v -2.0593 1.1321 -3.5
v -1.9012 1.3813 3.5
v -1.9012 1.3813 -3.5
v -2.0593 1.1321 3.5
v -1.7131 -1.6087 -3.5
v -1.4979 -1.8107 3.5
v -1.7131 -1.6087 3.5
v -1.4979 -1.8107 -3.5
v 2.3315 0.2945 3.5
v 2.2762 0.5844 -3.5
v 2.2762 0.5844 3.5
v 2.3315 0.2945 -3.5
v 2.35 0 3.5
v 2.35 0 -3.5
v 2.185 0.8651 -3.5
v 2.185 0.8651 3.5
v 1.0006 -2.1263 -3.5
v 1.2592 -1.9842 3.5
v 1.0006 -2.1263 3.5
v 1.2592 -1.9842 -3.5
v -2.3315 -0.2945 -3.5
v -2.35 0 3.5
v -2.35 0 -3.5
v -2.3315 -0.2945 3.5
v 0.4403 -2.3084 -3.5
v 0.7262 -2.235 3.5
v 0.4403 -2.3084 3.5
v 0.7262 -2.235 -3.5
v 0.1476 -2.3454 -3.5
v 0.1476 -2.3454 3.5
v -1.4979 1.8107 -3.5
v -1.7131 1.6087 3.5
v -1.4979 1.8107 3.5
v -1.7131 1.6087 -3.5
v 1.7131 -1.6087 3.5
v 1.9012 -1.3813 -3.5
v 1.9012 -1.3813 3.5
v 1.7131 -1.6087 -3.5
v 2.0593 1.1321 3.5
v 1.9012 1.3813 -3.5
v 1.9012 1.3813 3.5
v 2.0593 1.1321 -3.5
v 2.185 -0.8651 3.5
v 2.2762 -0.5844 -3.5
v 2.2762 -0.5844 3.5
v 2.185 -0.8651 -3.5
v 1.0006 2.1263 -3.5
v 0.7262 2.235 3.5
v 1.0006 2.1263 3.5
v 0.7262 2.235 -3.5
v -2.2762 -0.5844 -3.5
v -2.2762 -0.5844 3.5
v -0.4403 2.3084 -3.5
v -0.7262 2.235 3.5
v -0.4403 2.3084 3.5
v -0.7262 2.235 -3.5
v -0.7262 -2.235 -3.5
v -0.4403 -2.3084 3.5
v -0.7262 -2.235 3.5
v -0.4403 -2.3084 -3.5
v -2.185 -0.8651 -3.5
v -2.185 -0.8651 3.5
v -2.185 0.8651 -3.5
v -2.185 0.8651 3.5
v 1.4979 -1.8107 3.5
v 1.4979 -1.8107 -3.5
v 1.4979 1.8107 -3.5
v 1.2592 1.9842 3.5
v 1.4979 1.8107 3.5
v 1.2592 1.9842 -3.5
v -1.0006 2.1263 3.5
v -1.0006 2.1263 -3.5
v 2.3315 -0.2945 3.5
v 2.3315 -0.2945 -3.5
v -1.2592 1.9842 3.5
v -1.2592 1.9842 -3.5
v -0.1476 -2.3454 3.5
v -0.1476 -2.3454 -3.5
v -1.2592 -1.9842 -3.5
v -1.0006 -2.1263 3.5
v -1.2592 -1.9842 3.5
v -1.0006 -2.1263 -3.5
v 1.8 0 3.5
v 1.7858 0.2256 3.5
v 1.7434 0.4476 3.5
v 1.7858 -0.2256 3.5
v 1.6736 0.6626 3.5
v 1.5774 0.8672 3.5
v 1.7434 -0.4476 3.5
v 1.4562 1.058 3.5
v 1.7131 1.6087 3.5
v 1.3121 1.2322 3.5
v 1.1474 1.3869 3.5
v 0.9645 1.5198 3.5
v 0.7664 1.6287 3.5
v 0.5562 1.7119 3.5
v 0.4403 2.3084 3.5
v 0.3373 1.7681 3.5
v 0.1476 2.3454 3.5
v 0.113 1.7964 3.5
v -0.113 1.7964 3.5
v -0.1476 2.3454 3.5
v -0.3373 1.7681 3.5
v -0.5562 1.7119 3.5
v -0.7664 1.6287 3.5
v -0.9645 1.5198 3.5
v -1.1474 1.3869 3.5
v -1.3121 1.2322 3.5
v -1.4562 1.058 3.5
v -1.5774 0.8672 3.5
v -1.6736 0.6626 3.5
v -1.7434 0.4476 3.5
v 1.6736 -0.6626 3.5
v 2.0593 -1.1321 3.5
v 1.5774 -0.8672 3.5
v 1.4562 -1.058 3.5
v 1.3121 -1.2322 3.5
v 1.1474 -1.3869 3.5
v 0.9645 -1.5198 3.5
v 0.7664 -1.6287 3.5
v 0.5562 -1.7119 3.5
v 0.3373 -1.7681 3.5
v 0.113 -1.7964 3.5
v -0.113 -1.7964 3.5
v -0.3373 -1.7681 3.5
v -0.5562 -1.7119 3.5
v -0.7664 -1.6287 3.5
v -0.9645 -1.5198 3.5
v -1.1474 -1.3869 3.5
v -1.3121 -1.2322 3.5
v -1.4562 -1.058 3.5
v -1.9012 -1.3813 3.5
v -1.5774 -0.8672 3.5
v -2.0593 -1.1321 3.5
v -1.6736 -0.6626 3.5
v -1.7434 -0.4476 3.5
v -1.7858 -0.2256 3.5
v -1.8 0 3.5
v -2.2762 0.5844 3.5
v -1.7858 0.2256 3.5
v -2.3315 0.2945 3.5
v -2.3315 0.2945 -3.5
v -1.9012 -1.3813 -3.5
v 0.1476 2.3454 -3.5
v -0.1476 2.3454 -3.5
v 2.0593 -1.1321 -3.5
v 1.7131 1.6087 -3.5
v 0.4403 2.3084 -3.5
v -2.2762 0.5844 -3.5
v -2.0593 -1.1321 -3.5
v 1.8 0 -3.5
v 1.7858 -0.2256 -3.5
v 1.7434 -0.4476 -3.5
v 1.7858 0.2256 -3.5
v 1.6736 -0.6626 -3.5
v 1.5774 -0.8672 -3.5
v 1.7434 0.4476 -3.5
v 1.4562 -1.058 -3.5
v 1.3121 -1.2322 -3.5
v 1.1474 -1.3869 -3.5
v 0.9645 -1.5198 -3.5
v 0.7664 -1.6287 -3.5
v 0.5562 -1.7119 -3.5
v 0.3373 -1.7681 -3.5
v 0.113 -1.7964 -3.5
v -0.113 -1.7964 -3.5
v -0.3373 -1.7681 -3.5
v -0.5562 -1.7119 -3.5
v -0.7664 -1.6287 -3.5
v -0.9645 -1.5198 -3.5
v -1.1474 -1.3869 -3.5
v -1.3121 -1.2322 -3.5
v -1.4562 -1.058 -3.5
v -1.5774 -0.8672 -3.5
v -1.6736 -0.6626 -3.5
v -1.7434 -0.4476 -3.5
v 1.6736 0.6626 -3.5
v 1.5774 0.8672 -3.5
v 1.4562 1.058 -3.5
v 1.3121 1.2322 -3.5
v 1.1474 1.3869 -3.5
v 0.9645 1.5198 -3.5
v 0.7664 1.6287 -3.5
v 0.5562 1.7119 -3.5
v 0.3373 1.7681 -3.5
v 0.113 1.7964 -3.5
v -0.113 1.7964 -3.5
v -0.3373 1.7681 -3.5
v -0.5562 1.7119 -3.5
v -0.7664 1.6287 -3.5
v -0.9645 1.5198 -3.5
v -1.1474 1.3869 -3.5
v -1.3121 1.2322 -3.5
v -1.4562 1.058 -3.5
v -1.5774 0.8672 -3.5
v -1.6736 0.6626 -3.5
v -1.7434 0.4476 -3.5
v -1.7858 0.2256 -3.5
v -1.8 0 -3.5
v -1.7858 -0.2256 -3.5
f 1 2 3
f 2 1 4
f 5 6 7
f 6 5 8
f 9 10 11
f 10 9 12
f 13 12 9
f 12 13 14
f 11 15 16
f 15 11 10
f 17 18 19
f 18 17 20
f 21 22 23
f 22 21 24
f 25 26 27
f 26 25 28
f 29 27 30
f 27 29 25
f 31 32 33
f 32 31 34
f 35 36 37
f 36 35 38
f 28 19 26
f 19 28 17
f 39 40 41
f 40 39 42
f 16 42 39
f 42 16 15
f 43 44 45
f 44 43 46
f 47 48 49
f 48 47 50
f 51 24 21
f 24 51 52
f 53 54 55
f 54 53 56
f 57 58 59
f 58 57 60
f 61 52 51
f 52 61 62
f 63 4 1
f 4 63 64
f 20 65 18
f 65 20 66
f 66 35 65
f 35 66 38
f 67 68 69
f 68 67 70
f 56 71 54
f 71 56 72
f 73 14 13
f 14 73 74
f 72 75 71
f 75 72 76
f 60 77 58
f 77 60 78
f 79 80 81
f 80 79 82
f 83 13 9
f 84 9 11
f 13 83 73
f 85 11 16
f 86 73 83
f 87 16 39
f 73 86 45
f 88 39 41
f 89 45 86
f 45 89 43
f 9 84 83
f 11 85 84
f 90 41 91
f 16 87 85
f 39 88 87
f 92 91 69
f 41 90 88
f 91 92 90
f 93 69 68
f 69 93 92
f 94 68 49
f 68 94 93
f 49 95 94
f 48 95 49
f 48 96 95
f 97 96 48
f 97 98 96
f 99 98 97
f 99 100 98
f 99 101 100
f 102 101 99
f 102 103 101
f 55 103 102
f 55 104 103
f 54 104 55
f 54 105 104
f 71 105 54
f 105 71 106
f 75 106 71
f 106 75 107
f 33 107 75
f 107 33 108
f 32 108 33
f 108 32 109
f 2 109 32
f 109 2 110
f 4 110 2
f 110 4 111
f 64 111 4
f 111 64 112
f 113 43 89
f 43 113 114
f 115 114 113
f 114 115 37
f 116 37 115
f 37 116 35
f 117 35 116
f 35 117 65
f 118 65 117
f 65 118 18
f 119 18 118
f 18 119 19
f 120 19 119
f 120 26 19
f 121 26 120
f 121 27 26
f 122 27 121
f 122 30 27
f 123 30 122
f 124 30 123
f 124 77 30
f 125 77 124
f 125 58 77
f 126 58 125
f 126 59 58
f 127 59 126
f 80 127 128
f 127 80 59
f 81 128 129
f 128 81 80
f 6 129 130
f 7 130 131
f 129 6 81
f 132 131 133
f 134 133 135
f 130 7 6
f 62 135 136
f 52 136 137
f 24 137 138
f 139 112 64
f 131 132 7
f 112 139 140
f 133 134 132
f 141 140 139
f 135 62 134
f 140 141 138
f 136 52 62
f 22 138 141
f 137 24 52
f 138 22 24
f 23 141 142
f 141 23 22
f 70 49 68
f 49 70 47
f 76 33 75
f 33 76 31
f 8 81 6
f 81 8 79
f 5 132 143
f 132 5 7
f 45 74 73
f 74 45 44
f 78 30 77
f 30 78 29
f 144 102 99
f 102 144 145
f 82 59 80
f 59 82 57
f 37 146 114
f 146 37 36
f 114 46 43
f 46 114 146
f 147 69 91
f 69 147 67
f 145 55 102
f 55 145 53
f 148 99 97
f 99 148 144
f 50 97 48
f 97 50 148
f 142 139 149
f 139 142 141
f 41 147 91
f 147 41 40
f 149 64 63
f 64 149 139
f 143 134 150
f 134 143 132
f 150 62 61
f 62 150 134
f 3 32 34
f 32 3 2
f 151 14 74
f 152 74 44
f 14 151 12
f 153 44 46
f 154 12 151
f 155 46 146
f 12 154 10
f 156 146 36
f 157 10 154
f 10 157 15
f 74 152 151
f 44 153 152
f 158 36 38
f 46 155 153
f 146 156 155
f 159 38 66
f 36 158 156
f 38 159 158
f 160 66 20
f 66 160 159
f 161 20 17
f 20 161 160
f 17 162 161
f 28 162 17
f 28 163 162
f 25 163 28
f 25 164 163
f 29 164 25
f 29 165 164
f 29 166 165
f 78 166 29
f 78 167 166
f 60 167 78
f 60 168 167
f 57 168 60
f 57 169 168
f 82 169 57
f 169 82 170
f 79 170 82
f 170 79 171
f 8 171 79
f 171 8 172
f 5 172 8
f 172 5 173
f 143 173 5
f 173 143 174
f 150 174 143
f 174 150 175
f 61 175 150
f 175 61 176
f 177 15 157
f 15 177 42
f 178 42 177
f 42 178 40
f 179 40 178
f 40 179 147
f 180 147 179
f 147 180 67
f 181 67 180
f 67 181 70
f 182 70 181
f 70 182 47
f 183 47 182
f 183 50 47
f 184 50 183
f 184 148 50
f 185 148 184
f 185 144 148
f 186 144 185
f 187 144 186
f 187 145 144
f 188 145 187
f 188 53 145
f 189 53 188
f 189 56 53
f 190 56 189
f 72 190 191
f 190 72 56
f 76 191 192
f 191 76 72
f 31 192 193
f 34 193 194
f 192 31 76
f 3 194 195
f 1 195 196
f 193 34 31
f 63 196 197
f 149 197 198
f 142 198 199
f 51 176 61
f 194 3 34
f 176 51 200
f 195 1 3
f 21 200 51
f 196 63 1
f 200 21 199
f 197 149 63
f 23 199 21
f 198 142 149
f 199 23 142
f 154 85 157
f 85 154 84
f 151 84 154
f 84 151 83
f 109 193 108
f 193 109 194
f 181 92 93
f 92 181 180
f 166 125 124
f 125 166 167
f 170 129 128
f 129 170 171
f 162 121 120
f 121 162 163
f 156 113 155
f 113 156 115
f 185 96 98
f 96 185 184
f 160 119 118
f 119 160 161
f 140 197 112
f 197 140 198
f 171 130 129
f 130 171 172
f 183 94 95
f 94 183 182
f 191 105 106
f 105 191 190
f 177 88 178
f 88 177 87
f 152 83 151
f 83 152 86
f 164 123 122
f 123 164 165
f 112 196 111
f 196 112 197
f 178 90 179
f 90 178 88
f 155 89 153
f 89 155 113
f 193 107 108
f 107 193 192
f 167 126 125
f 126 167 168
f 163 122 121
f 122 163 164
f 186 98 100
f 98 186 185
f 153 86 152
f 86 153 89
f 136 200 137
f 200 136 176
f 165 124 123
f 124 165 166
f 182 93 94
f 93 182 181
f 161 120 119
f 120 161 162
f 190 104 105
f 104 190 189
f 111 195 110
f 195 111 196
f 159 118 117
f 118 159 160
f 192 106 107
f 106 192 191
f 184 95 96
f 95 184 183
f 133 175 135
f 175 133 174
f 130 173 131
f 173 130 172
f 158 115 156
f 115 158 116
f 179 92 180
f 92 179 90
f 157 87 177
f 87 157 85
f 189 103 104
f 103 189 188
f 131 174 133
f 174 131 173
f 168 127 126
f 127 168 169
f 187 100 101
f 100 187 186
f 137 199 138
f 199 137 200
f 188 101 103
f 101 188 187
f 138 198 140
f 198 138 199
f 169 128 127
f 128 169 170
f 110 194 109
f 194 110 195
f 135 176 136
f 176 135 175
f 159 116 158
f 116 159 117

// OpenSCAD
$fn = 50;


difference() {
	union() {
		translate(v = [0, 0, -3.5000000000]) {
			cylinder(h = 7, r = 2.3500000000);
		}
	}
	union() {
		#translate(v = [0, 0, -100.0000000000]) {
			cylinder(h = 200, r = 1.8000000000);
		}
	}
}
